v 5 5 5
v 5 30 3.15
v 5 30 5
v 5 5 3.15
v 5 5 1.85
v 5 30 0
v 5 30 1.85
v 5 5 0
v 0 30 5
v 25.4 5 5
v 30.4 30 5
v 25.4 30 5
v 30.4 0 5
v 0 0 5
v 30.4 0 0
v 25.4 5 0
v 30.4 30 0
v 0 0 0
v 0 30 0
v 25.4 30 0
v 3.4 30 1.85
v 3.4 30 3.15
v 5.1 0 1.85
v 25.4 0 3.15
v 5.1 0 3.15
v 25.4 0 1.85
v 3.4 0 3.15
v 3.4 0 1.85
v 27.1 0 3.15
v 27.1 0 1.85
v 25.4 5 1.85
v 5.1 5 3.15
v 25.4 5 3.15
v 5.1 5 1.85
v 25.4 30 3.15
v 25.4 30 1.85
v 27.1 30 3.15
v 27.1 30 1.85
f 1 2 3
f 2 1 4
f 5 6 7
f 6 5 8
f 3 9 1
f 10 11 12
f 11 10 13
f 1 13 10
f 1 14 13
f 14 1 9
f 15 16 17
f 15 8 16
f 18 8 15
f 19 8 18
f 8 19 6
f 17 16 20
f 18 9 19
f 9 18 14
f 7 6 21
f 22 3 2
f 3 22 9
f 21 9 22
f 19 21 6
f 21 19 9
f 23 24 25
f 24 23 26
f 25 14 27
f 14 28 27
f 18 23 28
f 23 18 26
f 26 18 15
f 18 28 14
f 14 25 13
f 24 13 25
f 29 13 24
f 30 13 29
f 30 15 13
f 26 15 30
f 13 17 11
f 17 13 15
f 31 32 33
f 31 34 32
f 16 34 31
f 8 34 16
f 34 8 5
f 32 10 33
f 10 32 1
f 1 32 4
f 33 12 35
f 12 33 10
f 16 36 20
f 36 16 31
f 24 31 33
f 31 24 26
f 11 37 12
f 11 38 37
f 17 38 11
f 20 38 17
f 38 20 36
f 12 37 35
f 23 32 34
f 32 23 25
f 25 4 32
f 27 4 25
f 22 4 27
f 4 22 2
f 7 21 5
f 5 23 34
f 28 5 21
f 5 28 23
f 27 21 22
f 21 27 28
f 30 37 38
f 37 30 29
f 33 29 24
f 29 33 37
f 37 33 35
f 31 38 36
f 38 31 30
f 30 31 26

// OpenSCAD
// Parameters
frame_width = 25.4 + 5;      // Total width of the frame
frame_height = 30;     // Height of the frame
frame_depth = 5;       // Depth (thickness) of the frame
beam_thickness = 5;    // Thickness of the frame beams
slit_depth = 1.5;         // Depth of the slit into the beams
slit_width = 1.1;         // Width of the slit (for the glass pane)
extra = 0.1;            // Small extension to avoid overlapping faces

// Main Module
difference() {
    frame();
    slits();
}

// Frame Module: Creates the U-shaped frame
module frame() {
    union() {
        // Left vertical beam
        cube([beam_thickness, frame_height, frame_depth]);
        
        // Bottom horizontal beam
        cube([frame_width, beam_thickness, frame_depth]);
        
        // Right vertical beam
        translate([frame_width - beam_thickness, 0, 0])
            cube([beam_thickness, frame_height, frame_depth]);
    }
}

// Slits Module: Creates the continuous slit along the inner faces
module slits() {
    // Left vertical beam slit
    translate([beam_thickness - slit_depth - extra, -extra, (frame_depth - slit_width)/2 - extra])
        cube([slit_depth + extra*2, frame_height + extra*2, slit_width + extra*2]);
    
    // Right vertical beam slit
    translate([frame_width - beam_thickness, -extra, (frame_depth - slit_width)/2 - extra])
        cube([slit_depth + extra*2, frame_height + extra*2, slit_width + extra*2]);
    
}
